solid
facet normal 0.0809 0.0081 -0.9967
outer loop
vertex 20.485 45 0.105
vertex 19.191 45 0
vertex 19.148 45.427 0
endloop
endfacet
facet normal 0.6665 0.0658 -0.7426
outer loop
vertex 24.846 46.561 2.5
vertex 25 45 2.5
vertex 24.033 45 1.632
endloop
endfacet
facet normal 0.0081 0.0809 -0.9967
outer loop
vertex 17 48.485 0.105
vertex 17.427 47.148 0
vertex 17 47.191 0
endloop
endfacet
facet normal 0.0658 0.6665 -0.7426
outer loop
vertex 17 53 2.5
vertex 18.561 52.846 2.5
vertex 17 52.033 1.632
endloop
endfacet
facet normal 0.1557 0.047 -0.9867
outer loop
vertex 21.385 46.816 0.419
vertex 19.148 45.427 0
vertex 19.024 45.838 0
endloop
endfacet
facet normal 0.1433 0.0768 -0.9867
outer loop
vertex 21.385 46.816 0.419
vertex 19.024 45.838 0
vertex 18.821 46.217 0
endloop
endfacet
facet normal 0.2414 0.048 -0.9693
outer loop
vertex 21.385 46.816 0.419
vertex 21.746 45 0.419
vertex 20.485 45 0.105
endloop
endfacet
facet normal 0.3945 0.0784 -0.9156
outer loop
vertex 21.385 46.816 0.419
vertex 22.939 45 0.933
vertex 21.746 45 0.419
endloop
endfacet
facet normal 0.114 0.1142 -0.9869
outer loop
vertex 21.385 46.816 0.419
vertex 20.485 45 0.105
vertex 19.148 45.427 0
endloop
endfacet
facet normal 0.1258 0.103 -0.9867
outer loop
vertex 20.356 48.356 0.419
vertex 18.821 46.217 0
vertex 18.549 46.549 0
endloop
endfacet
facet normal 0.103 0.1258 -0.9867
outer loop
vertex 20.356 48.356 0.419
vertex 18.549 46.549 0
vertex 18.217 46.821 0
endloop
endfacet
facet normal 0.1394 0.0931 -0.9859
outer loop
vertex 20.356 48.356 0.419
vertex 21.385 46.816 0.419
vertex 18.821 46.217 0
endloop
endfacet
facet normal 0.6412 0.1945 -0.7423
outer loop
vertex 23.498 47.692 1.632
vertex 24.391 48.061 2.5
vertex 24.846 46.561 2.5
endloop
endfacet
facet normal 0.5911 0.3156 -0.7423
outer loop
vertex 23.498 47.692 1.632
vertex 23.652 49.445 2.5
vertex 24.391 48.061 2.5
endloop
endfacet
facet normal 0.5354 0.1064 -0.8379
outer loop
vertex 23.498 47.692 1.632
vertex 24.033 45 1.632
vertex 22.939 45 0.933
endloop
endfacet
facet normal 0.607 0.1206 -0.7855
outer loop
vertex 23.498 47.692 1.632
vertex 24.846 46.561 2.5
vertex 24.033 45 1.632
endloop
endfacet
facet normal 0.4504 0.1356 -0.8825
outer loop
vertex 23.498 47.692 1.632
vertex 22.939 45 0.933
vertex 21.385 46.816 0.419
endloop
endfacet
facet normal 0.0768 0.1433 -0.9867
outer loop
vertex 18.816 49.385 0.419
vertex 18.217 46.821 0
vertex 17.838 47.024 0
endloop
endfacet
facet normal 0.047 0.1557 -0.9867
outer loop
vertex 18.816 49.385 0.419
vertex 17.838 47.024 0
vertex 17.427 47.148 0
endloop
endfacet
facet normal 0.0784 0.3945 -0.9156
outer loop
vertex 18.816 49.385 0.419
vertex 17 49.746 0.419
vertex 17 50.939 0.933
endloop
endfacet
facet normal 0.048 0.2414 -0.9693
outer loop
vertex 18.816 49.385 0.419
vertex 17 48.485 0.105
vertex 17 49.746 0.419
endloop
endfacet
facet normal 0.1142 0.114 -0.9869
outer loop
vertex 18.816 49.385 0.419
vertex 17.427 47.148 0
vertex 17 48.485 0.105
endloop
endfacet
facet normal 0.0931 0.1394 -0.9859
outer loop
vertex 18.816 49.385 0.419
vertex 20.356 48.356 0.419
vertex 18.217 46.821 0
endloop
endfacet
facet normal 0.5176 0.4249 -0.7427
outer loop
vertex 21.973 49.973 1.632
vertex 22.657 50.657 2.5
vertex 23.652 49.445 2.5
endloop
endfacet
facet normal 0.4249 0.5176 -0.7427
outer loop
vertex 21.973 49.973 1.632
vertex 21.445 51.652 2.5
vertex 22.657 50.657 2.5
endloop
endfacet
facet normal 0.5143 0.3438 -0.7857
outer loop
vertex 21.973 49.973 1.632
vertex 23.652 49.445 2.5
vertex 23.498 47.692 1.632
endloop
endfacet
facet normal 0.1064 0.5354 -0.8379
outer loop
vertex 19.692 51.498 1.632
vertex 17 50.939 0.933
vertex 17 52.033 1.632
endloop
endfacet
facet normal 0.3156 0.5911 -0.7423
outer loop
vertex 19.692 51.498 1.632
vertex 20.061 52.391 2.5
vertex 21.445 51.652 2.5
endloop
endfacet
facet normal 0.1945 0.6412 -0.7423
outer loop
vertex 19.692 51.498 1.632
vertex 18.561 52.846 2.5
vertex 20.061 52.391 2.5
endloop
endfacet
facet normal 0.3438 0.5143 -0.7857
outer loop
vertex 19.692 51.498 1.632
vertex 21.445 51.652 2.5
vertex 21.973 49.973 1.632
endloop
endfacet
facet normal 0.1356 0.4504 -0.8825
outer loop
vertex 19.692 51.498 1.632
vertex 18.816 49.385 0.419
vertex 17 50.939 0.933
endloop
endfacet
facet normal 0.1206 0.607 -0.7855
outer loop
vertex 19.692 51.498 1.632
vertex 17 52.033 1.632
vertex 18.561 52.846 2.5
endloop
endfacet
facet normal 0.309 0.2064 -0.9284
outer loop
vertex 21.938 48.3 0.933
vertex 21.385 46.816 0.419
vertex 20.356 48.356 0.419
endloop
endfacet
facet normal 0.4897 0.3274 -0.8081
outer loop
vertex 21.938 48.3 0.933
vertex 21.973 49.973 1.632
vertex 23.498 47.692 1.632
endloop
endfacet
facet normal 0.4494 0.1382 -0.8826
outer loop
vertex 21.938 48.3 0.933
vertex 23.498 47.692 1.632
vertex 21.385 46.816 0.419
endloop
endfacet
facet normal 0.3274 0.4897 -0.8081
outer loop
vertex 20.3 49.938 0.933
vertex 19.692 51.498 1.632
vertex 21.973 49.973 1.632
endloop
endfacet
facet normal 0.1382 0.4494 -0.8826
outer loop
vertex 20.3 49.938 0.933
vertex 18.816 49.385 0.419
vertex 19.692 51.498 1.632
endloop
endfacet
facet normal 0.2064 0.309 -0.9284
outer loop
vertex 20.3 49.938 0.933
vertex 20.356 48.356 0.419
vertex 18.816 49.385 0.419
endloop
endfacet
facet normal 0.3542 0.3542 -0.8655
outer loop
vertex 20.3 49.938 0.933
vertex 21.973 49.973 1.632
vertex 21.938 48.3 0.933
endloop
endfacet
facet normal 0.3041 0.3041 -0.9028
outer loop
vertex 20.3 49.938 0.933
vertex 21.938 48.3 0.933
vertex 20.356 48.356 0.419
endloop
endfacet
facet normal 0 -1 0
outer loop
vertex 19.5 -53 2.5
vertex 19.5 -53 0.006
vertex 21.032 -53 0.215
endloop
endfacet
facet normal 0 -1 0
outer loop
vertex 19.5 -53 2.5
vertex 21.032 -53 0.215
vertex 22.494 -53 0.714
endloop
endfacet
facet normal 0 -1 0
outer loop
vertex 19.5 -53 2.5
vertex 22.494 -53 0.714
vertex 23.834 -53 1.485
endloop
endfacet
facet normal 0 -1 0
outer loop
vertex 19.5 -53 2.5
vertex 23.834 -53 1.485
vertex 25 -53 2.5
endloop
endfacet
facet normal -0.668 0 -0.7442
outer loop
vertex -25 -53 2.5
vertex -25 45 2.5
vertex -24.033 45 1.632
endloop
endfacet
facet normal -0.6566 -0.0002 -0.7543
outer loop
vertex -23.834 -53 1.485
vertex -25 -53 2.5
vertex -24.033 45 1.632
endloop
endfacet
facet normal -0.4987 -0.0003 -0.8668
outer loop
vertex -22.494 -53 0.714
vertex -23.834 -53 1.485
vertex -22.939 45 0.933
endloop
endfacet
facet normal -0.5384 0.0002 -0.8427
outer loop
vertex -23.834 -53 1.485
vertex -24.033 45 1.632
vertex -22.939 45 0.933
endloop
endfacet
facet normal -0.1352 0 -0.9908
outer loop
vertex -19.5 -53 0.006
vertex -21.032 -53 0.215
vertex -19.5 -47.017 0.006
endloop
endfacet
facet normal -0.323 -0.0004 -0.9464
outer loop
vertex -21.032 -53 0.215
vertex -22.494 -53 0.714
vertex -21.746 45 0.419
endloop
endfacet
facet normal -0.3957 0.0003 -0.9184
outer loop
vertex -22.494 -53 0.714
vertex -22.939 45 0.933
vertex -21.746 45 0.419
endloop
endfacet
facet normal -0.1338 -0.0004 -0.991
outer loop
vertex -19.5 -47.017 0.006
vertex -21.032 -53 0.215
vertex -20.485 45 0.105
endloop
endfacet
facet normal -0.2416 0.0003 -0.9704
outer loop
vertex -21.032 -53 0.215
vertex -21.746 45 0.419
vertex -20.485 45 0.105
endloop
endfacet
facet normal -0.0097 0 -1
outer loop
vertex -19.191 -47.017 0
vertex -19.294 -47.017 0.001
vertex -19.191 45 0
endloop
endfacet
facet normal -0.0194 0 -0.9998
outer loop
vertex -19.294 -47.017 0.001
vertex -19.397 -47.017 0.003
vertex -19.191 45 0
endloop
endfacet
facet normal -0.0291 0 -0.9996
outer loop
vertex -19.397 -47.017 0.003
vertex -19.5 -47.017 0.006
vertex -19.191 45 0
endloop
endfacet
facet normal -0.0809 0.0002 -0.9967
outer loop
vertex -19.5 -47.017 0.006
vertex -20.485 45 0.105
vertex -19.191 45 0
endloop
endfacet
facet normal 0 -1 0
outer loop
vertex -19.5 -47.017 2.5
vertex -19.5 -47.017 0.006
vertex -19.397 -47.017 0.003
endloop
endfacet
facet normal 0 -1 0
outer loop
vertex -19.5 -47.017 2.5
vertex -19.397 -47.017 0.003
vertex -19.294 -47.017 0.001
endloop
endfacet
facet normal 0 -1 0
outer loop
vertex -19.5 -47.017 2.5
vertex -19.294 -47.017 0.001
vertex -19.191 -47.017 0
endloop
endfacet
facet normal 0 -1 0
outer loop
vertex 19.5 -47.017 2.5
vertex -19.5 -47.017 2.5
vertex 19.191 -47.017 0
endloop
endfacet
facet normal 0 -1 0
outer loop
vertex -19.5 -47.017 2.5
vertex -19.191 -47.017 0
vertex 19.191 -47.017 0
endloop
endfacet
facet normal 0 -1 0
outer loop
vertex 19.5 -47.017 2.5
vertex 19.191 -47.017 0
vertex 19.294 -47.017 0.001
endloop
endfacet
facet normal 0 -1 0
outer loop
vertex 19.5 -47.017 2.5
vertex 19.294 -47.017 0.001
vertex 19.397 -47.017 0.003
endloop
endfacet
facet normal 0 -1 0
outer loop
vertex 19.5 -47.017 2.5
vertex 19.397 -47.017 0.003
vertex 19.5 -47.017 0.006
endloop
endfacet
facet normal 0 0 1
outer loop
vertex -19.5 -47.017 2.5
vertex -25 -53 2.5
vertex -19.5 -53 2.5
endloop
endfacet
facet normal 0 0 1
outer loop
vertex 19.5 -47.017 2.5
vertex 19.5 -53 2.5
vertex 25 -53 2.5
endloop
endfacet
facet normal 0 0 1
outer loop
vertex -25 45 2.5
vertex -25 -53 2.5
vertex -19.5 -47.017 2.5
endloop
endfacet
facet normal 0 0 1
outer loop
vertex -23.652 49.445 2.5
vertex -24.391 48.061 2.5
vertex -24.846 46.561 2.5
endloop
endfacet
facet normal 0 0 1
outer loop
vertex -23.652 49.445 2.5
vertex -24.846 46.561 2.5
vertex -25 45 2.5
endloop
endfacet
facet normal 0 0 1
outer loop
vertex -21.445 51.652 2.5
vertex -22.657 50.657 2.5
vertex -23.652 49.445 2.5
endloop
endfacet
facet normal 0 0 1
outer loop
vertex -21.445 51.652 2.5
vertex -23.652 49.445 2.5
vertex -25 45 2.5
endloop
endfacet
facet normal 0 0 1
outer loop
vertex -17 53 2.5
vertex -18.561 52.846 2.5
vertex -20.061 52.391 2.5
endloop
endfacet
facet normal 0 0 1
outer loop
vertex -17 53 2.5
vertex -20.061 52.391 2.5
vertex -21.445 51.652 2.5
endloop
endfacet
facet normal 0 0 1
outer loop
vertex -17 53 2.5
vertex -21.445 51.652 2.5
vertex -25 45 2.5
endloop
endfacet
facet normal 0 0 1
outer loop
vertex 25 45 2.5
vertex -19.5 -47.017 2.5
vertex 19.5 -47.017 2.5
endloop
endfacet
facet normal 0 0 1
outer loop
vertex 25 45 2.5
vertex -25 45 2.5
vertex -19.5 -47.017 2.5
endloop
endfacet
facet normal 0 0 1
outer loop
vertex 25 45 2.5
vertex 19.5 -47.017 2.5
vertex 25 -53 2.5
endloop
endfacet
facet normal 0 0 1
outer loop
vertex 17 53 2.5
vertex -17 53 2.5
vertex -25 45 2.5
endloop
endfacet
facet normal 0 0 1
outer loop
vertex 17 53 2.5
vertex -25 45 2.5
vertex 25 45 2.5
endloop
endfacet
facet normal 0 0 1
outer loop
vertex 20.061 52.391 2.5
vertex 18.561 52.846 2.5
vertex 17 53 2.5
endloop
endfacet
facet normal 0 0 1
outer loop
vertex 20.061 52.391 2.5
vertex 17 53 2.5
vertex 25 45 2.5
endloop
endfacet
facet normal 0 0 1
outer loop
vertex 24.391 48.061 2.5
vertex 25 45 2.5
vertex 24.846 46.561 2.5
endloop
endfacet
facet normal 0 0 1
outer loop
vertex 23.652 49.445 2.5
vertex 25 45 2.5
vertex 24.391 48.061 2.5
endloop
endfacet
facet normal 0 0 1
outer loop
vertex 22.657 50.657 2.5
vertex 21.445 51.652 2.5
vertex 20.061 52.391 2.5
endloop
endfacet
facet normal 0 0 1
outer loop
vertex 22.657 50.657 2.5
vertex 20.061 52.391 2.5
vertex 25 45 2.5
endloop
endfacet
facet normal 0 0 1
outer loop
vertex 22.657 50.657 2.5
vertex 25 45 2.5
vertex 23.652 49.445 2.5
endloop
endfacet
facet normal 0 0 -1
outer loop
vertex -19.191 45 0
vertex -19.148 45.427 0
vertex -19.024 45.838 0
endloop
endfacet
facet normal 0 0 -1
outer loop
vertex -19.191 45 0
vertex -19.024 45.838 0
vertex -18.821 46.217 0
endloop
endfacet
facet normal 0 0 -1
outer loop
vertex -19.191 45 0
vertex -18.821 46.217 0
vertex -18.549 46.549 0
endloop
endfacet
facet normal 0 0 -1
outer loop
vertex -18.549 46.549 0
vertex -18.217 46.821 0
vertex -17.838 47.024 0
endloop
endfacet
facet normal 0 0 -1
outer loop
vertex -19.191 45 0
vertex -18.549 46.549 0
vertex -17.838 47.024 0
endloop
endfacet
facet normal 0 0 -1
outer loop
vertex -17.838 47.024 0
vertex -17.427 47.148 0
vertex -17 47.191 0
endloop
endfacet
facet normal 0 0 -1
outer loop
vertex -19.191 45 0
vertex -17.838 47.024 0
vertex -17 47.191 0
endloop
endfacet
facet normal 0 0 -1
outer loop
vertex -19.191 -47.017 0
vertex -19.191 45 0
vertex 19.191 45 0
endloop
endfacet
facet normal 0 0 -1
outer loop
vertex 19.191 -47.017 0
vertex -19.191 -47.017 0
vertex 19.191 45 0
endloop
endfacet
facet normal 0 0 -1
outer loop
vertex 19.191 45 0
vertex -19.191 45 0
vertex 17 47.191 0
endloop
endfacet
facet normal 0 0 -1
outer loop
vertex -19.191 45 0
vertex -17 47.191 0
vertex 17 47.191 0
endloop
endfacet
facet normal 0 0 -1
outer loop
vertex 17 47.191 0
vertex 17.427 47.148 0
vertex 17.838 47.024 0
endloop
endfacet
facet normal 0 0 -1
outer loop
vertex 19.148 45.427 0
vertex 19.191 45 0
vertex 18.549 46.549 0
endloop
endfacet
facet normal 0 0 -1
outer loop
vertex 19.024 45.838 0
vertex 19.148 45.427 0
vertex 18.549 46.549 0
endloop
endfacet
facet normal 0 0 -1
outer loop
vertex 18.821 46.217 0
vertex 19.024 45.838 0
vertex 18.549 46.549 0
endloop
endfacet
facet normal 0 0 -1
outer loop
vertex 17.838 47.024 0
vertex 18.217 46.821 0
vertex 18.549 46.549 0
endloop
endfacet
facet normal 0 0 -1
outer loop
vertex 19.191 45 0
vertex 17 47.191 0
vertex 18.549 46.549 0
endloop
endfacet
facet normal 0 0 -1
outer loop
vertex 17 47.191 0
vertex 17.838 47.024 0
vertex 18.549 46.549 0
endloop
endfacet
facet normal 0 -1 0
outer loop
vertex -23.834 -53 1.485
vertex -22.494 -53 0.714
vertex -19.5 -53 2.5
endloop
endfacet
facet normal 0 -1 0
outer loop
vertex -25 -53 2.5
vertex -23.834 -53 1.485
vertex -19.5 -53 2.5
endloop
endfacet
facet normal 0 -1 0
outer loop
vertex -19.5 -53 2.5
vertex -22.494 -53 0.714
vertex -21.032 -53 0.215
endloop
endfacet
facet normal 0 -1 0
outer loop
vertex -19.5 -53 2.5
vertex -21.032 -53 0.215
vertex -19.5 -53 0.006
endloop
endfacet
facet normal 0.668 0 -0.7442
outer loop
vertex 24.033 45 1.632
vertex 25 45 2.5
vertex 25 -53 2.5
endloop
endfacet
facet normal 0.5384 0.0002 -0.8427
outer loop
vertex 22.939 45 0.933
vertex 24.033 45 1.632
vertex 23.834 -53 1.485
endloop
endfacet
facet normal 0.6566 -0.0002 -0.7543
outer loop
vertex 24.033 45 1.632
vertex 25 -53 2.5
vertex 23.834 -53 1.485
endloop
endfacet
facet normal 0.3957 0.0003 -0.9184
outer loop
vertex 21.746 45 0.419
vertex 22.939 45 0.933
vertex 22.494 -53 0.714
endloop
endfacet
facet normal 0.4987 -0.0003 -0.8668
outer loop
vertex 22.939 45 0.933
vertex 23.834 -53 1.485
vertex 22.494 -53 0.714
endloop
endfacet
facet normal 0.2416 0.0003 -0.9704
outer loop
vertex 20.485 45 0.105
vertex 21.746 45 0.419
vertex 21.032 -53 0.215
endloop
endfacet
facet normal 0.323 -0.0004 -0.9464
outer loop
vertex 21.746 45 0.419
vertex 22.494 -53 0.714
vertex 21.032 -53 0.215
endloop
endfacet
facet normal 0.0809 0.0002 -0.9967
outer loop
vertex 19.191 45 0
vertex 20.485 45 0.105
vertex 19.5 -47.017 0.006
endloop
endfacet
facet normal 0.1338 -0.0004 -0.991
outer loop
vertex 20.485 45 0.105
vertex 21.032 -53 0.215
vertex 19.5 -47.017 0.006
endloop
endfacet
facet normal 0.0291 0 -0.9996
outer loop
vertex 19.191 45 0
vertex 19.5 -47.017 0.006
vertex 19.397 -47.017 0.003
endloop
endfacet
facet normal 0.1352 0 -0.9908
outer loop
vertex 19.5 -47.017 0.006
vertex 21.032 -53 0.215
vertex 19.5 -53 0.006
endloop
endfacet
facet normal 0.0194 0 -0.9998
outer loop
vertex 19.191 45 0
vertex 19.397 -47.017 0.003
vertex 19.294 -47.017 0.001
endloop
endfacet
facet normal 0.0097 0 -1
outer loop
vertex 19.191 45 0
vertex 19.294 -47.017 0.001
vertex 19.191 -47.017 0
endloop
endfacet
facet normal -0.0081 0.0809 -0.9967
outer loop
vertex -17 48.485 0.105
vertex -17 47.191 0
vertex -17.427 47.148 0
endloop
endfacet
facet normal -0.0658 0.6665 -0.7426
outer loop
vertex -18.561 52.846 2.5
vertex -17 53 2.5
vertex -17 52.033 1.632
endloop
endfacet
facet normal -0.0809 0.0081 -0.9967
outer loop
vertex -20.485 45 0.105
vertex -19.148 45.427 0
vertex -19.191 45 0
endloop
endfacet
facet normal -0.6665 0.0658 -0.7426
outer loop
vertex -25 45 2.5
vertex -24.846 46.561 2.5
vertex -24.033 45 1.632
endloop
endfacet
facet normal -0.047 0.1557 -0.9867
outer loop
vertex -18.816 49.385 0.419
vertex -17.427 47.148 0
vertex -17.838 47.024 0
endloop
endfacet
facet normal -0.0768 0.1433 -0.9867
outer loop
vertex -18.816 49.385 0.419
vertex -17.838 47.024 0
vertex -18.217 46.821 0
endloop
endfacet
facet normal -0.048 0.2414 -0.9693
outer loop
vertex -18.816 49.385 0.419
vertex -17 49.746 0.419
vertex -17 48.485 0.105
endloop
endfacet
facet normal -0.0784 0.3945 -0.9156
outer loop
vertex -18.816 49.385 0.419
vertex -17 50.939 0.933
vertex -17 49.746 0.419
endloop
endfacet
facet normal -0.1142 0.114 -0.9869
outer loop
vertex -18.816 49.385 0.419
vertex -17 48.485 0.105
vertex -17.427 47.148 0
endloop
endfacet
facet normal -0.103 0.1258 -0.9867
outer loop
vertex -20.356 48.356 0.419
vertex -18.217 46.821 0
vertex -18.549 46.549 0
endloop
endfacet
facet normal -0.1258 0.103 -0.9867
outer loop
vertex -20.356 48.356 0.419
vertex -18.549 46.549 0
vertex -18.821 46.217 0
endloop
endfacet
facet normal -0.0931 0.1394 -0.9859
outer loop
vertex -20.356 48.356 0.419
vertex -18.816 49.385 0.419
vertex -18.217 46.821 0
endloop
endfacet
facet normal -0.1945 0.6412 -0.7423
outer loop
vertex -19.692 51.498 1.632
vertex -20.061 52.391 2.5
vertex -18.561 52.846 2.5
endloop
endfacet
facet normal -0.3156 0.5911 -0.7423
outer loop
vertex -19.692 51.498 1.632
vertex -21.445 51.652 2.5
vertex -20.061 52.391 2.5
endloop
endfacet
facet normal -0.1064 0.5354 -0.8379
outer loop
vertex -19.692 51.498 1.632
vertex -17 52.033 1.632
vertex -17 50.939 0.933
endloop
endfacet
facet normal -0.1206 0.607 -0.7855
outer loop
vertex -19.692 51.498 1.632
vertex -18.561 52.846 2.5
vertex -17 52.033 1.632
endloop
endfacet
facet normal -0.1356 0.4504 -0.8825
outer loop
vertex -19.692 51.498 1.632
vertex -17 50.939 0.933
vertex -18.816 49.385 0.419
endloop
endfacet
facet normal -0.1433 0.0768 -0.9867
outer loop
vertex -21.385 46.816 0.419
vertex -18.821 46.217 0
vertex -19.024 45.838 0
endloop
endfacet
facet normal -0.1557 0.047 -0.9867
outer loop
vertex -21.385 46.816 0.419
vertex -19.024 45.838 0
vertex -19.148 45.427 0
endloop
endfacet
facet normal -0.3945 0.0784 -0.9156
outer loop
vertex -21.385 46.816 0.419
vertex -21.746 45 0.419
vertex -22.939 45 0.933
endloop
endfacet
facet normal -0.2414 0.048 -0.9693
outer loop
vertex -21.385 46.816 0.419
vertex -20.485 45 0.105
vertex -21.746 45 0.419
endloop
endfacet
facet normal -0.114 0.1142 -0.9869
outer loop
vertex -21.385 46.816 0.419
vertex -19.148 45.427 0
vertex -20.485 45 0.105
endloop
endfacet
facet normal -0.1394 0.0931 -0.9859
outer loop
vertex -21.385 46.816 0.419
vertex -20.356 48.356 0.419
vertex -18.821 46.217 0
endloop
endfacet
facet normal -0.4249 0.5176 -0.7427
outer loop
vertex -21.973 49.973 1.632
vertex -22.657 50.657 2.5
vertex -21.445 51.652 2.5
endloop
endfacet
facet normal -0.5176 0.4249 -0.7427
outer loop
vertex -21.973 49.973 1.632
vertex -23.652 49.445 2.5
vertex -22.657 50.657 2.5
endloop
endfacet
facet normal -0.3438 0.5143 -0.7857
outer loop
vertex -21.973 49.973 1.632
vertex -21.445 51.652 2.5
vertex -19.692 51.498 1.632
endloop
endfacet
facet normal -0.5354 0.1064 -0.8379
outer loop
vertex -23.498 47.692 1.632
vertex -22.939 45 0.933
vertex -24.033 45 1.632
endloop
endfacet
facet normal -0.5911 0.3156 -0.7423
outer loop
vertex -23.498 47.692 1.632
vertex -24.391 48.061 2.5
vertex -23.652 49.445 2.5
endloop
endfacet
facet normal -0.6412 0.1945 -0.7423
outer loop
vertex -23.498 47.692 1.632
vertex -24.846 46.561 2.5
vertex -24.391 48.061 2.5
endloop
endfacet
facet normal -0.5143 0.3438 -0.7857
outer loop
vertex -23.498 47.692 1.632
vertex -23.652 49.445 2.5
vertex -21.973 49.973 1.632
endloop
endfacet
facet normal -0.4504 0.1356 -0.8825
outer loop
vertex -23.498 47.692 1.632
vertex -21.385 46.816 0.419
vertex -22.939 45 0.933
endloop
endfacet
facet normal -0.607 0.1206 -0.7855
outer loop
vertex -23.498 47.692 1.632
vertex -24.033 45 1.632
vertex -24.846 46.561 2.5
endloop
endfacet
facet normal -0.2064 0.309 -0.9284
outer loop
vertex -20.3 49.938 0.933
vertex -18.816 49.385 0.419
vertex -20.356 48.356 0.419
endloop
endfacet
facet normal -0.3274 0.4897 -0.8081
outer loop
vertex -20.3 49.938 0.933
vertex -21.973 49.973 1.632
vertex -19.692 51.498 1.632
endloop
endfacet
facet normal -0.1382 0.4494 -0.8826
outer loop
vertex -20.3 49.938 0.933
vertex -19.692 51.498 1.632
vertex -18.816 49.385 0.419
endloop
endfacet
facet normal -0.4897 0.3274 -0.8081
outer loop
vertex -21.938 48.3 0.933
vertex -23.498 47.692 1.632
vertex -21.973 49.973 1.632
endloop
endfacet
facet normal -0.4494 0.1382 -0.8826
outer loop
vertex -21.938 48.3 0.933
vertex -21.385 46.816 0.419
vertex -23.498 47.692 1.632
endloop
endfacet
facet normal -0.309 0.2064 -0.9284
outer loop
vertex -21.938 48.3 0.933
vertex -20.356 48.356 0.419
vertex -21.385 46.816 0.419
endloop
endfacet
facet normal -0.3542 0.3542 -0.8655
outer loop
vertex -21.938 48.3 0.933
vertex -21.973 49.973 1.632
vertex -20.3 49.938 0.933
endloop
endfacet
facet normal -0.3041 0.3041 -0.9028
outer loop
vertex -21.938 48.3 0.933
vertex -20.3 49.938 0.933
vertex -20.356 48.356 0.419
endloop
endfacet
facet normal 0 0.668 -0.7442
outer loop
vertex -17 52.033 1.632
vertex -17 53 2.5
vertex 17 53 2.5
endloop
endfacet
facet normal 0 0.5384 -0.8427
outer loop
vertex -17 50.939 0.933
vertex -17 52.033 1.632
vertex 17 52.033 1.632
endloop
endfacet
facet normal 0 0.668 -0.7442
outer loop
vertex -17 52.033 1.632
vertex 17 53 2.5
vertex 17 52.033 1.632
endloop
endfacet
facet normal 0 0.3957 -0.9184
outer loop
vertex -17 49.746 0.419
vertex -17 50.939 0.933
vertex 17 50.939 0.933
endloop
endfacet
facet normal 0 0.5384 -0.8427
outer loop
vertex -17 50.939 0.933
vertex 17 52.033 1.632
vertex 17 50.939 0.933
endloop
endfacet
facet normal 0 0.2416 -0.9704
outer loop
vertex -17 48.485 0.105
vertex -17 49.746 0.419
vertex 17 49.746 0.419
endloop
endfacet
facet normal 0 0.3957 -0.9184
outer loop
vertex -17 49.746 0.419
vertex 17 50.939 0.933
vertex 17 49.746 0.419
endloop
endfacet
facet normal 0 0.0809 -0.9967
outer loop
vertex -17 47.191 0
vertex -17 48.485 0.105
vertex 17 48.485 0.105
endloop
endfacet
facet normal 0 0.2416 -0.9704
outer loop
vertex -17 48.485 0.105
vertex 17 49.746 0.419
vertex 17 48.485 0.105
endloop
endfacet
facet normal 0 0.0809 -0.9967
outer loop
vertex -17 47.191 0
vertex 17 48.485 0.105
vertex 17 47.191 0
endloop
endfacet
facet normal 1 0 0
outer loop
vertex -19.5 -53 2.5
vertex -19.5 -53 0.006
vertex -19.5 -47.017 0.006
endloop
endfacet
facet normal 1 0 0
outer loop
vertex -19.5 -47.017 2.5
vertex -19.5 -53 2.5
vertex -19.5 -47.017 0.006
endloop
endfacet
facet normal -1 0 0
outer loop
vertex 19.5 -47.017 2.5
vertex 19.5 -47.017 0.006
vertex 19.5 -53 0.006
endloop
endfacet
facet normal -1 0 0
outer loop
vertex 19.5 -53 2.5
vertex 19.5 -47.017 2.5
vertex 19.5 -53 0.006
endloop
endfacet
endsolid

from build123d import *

# Parameters (mm, degrees)
BOSS_EXTRUDE1_DEPTH = 2.5
FILLET1_R           = 8
FILLET2_R           = 8


with BuildPart() as part:
    # Sketch1 → Boss-Extrude1 (new body)
    with BuildSketch(Plane.XY):
        Polygon((19.5, -53), (25, -53), (25, 53), (-25, 53), (-25, -53), (-19.5, -53), (-19.5, -47.017253966), (19.5, -47.017253966), align=None)
    extrude(amount=BOSS_EXTRUDE1_DEPTH)

    # Fillet1
    fillet1_edges = [part.edges().sort_by_distance(p)[0] for p in [
        (-25, 53, 1.25),
        (25, 53, 1.25),
    ]]
    fillet(fillet1_edges, radius=FILLET1_R)

    # Fillet2
    # the kernel refuses this fillet: 8 mm, written as the material it takes off along each edge
    with BuildSketch(Plane(origin=(-25, 45, 0), x_dir=(1, 0, 0), z_dir=(0, -1, 0))) as fillet2_piece_1:
        with BuildLine():
            CenterArc((5.809475019, 8), FILLET2_R, 223.432536558, 46.567463442)
            Line((0, 2.5), (-0.1161895, 2.39))
            ThreePointArc((-0.1161895, 2.39), (-0.16, 1.25), (-0.16, 0))
            Line((-0.16, 0), (0, -0.16))
            Line((0, -0.16), (5.809475019, -0.16))
            Line((5.809475019, -0.16), (5.809475019, 0))
        make_face()
    extrude(amount=112.523687548, mode=Mode.SUBTRACT)
    with BuildSketch(Plane(origin=(-17, 45, 0), x_dir=(0, 1, 0), z_dir=(1, 0, 0))) as fillet2_piece_2:
        with BuildLine():
            CenterArc((2.190524981, 8), FILLET2_R, 270, 46.567463442)
            Line((8, 2.5), (8.1161895, 2.39))
            ThreePointArc((8.1161895, 2.39), (8.16, 1.25), (8.16, 0))
            Line((8.16, 0), (8, -0.16))
            Line((8, -0.16), (2.190524981, -0.16))
            Line((2.190524981, -0.16), (2.190524981, 0))
        make_face()
    revolve(axis=Axis((-17, 45, 0), (0, 0, 1)), revolution_arc=90, mode=Mode.SUBTRACT)
    with BuildSketch(Plane(origin=(17, 53, 0), x_dir=(0, -1, 0), z_dir=(-1, 0, 0))) as fillet2_piece_3:
        with BuildLine():
            CenterArc((5.809475019, 8), FILLET2_R, 223.432536558, 46.567463442)
            Line((0, 2.5), (-0.1161895, 2.39))
            ThreePointArc((-0.1161895, 2.39), (-0.16, 1.25), (-0.16, 0))
            Line((-0.16, 0), (0, -0.16))
            Line((0, -0.16), (5.809475019, -0.16))
            Line((5.809475019, -0.16), (5.809475019, 0))
        make_face()
    extrude(amount=34, mode=Mode.SUBTRACT)
    with BuildSketch(Plane(origin=(17, 45, 0), x_dir=(1, 0, 0), z_dir=(0, -1, 0))) as fillet2_piece_4:
        with BuildLine():
            CenterArc((2.190524981, 8), FILLET2_R, 270, 46.567463442)
            Line((8, 2.5), (8.1161895, 2.39))
            ThreePointArc((8.1161895, 2.39), (8.16, 1.25), (8.16, 0))
            Line((8.16, 0), (8, -0.16))
            Line((8, -0.16), (2.190524981, -0.16))
            Line((2.190524981, -0.16), (2.190524981, 0))
        make_face()
    revolve(axis=Axis((17, 45, 0), (0, 0, 1)), revolution_arc=90, mode=Mode.SUBTRACT)
    with BuildSketch(Plane(origin=(25, -67.523687548, 0), x_dir=(0, 0, 1), z_dir=(0, 1, 0))) as fillet2_piece_5:
        with BuildLine():
            CenterArc((8, -5.809475019), FILLET2_R, 133.432536558, 46.567463442)
            Line((0, -5.809475019), (-0.16, -5.809475019))
            Line((-0.16, -5.809475019), (-0.16, 0))
            Line((-0.16, 0), (0, 0.16))
            ThreePointArc((0, 0.16), (1.25, 0.16), (2.39, 0.1161895))
            Line((2.39, 0.1161895), (2.5, 0))
        make_face()
    extrude(amount=112.523687548, mode=Mode.SUBTRACT)


solid = part.part
